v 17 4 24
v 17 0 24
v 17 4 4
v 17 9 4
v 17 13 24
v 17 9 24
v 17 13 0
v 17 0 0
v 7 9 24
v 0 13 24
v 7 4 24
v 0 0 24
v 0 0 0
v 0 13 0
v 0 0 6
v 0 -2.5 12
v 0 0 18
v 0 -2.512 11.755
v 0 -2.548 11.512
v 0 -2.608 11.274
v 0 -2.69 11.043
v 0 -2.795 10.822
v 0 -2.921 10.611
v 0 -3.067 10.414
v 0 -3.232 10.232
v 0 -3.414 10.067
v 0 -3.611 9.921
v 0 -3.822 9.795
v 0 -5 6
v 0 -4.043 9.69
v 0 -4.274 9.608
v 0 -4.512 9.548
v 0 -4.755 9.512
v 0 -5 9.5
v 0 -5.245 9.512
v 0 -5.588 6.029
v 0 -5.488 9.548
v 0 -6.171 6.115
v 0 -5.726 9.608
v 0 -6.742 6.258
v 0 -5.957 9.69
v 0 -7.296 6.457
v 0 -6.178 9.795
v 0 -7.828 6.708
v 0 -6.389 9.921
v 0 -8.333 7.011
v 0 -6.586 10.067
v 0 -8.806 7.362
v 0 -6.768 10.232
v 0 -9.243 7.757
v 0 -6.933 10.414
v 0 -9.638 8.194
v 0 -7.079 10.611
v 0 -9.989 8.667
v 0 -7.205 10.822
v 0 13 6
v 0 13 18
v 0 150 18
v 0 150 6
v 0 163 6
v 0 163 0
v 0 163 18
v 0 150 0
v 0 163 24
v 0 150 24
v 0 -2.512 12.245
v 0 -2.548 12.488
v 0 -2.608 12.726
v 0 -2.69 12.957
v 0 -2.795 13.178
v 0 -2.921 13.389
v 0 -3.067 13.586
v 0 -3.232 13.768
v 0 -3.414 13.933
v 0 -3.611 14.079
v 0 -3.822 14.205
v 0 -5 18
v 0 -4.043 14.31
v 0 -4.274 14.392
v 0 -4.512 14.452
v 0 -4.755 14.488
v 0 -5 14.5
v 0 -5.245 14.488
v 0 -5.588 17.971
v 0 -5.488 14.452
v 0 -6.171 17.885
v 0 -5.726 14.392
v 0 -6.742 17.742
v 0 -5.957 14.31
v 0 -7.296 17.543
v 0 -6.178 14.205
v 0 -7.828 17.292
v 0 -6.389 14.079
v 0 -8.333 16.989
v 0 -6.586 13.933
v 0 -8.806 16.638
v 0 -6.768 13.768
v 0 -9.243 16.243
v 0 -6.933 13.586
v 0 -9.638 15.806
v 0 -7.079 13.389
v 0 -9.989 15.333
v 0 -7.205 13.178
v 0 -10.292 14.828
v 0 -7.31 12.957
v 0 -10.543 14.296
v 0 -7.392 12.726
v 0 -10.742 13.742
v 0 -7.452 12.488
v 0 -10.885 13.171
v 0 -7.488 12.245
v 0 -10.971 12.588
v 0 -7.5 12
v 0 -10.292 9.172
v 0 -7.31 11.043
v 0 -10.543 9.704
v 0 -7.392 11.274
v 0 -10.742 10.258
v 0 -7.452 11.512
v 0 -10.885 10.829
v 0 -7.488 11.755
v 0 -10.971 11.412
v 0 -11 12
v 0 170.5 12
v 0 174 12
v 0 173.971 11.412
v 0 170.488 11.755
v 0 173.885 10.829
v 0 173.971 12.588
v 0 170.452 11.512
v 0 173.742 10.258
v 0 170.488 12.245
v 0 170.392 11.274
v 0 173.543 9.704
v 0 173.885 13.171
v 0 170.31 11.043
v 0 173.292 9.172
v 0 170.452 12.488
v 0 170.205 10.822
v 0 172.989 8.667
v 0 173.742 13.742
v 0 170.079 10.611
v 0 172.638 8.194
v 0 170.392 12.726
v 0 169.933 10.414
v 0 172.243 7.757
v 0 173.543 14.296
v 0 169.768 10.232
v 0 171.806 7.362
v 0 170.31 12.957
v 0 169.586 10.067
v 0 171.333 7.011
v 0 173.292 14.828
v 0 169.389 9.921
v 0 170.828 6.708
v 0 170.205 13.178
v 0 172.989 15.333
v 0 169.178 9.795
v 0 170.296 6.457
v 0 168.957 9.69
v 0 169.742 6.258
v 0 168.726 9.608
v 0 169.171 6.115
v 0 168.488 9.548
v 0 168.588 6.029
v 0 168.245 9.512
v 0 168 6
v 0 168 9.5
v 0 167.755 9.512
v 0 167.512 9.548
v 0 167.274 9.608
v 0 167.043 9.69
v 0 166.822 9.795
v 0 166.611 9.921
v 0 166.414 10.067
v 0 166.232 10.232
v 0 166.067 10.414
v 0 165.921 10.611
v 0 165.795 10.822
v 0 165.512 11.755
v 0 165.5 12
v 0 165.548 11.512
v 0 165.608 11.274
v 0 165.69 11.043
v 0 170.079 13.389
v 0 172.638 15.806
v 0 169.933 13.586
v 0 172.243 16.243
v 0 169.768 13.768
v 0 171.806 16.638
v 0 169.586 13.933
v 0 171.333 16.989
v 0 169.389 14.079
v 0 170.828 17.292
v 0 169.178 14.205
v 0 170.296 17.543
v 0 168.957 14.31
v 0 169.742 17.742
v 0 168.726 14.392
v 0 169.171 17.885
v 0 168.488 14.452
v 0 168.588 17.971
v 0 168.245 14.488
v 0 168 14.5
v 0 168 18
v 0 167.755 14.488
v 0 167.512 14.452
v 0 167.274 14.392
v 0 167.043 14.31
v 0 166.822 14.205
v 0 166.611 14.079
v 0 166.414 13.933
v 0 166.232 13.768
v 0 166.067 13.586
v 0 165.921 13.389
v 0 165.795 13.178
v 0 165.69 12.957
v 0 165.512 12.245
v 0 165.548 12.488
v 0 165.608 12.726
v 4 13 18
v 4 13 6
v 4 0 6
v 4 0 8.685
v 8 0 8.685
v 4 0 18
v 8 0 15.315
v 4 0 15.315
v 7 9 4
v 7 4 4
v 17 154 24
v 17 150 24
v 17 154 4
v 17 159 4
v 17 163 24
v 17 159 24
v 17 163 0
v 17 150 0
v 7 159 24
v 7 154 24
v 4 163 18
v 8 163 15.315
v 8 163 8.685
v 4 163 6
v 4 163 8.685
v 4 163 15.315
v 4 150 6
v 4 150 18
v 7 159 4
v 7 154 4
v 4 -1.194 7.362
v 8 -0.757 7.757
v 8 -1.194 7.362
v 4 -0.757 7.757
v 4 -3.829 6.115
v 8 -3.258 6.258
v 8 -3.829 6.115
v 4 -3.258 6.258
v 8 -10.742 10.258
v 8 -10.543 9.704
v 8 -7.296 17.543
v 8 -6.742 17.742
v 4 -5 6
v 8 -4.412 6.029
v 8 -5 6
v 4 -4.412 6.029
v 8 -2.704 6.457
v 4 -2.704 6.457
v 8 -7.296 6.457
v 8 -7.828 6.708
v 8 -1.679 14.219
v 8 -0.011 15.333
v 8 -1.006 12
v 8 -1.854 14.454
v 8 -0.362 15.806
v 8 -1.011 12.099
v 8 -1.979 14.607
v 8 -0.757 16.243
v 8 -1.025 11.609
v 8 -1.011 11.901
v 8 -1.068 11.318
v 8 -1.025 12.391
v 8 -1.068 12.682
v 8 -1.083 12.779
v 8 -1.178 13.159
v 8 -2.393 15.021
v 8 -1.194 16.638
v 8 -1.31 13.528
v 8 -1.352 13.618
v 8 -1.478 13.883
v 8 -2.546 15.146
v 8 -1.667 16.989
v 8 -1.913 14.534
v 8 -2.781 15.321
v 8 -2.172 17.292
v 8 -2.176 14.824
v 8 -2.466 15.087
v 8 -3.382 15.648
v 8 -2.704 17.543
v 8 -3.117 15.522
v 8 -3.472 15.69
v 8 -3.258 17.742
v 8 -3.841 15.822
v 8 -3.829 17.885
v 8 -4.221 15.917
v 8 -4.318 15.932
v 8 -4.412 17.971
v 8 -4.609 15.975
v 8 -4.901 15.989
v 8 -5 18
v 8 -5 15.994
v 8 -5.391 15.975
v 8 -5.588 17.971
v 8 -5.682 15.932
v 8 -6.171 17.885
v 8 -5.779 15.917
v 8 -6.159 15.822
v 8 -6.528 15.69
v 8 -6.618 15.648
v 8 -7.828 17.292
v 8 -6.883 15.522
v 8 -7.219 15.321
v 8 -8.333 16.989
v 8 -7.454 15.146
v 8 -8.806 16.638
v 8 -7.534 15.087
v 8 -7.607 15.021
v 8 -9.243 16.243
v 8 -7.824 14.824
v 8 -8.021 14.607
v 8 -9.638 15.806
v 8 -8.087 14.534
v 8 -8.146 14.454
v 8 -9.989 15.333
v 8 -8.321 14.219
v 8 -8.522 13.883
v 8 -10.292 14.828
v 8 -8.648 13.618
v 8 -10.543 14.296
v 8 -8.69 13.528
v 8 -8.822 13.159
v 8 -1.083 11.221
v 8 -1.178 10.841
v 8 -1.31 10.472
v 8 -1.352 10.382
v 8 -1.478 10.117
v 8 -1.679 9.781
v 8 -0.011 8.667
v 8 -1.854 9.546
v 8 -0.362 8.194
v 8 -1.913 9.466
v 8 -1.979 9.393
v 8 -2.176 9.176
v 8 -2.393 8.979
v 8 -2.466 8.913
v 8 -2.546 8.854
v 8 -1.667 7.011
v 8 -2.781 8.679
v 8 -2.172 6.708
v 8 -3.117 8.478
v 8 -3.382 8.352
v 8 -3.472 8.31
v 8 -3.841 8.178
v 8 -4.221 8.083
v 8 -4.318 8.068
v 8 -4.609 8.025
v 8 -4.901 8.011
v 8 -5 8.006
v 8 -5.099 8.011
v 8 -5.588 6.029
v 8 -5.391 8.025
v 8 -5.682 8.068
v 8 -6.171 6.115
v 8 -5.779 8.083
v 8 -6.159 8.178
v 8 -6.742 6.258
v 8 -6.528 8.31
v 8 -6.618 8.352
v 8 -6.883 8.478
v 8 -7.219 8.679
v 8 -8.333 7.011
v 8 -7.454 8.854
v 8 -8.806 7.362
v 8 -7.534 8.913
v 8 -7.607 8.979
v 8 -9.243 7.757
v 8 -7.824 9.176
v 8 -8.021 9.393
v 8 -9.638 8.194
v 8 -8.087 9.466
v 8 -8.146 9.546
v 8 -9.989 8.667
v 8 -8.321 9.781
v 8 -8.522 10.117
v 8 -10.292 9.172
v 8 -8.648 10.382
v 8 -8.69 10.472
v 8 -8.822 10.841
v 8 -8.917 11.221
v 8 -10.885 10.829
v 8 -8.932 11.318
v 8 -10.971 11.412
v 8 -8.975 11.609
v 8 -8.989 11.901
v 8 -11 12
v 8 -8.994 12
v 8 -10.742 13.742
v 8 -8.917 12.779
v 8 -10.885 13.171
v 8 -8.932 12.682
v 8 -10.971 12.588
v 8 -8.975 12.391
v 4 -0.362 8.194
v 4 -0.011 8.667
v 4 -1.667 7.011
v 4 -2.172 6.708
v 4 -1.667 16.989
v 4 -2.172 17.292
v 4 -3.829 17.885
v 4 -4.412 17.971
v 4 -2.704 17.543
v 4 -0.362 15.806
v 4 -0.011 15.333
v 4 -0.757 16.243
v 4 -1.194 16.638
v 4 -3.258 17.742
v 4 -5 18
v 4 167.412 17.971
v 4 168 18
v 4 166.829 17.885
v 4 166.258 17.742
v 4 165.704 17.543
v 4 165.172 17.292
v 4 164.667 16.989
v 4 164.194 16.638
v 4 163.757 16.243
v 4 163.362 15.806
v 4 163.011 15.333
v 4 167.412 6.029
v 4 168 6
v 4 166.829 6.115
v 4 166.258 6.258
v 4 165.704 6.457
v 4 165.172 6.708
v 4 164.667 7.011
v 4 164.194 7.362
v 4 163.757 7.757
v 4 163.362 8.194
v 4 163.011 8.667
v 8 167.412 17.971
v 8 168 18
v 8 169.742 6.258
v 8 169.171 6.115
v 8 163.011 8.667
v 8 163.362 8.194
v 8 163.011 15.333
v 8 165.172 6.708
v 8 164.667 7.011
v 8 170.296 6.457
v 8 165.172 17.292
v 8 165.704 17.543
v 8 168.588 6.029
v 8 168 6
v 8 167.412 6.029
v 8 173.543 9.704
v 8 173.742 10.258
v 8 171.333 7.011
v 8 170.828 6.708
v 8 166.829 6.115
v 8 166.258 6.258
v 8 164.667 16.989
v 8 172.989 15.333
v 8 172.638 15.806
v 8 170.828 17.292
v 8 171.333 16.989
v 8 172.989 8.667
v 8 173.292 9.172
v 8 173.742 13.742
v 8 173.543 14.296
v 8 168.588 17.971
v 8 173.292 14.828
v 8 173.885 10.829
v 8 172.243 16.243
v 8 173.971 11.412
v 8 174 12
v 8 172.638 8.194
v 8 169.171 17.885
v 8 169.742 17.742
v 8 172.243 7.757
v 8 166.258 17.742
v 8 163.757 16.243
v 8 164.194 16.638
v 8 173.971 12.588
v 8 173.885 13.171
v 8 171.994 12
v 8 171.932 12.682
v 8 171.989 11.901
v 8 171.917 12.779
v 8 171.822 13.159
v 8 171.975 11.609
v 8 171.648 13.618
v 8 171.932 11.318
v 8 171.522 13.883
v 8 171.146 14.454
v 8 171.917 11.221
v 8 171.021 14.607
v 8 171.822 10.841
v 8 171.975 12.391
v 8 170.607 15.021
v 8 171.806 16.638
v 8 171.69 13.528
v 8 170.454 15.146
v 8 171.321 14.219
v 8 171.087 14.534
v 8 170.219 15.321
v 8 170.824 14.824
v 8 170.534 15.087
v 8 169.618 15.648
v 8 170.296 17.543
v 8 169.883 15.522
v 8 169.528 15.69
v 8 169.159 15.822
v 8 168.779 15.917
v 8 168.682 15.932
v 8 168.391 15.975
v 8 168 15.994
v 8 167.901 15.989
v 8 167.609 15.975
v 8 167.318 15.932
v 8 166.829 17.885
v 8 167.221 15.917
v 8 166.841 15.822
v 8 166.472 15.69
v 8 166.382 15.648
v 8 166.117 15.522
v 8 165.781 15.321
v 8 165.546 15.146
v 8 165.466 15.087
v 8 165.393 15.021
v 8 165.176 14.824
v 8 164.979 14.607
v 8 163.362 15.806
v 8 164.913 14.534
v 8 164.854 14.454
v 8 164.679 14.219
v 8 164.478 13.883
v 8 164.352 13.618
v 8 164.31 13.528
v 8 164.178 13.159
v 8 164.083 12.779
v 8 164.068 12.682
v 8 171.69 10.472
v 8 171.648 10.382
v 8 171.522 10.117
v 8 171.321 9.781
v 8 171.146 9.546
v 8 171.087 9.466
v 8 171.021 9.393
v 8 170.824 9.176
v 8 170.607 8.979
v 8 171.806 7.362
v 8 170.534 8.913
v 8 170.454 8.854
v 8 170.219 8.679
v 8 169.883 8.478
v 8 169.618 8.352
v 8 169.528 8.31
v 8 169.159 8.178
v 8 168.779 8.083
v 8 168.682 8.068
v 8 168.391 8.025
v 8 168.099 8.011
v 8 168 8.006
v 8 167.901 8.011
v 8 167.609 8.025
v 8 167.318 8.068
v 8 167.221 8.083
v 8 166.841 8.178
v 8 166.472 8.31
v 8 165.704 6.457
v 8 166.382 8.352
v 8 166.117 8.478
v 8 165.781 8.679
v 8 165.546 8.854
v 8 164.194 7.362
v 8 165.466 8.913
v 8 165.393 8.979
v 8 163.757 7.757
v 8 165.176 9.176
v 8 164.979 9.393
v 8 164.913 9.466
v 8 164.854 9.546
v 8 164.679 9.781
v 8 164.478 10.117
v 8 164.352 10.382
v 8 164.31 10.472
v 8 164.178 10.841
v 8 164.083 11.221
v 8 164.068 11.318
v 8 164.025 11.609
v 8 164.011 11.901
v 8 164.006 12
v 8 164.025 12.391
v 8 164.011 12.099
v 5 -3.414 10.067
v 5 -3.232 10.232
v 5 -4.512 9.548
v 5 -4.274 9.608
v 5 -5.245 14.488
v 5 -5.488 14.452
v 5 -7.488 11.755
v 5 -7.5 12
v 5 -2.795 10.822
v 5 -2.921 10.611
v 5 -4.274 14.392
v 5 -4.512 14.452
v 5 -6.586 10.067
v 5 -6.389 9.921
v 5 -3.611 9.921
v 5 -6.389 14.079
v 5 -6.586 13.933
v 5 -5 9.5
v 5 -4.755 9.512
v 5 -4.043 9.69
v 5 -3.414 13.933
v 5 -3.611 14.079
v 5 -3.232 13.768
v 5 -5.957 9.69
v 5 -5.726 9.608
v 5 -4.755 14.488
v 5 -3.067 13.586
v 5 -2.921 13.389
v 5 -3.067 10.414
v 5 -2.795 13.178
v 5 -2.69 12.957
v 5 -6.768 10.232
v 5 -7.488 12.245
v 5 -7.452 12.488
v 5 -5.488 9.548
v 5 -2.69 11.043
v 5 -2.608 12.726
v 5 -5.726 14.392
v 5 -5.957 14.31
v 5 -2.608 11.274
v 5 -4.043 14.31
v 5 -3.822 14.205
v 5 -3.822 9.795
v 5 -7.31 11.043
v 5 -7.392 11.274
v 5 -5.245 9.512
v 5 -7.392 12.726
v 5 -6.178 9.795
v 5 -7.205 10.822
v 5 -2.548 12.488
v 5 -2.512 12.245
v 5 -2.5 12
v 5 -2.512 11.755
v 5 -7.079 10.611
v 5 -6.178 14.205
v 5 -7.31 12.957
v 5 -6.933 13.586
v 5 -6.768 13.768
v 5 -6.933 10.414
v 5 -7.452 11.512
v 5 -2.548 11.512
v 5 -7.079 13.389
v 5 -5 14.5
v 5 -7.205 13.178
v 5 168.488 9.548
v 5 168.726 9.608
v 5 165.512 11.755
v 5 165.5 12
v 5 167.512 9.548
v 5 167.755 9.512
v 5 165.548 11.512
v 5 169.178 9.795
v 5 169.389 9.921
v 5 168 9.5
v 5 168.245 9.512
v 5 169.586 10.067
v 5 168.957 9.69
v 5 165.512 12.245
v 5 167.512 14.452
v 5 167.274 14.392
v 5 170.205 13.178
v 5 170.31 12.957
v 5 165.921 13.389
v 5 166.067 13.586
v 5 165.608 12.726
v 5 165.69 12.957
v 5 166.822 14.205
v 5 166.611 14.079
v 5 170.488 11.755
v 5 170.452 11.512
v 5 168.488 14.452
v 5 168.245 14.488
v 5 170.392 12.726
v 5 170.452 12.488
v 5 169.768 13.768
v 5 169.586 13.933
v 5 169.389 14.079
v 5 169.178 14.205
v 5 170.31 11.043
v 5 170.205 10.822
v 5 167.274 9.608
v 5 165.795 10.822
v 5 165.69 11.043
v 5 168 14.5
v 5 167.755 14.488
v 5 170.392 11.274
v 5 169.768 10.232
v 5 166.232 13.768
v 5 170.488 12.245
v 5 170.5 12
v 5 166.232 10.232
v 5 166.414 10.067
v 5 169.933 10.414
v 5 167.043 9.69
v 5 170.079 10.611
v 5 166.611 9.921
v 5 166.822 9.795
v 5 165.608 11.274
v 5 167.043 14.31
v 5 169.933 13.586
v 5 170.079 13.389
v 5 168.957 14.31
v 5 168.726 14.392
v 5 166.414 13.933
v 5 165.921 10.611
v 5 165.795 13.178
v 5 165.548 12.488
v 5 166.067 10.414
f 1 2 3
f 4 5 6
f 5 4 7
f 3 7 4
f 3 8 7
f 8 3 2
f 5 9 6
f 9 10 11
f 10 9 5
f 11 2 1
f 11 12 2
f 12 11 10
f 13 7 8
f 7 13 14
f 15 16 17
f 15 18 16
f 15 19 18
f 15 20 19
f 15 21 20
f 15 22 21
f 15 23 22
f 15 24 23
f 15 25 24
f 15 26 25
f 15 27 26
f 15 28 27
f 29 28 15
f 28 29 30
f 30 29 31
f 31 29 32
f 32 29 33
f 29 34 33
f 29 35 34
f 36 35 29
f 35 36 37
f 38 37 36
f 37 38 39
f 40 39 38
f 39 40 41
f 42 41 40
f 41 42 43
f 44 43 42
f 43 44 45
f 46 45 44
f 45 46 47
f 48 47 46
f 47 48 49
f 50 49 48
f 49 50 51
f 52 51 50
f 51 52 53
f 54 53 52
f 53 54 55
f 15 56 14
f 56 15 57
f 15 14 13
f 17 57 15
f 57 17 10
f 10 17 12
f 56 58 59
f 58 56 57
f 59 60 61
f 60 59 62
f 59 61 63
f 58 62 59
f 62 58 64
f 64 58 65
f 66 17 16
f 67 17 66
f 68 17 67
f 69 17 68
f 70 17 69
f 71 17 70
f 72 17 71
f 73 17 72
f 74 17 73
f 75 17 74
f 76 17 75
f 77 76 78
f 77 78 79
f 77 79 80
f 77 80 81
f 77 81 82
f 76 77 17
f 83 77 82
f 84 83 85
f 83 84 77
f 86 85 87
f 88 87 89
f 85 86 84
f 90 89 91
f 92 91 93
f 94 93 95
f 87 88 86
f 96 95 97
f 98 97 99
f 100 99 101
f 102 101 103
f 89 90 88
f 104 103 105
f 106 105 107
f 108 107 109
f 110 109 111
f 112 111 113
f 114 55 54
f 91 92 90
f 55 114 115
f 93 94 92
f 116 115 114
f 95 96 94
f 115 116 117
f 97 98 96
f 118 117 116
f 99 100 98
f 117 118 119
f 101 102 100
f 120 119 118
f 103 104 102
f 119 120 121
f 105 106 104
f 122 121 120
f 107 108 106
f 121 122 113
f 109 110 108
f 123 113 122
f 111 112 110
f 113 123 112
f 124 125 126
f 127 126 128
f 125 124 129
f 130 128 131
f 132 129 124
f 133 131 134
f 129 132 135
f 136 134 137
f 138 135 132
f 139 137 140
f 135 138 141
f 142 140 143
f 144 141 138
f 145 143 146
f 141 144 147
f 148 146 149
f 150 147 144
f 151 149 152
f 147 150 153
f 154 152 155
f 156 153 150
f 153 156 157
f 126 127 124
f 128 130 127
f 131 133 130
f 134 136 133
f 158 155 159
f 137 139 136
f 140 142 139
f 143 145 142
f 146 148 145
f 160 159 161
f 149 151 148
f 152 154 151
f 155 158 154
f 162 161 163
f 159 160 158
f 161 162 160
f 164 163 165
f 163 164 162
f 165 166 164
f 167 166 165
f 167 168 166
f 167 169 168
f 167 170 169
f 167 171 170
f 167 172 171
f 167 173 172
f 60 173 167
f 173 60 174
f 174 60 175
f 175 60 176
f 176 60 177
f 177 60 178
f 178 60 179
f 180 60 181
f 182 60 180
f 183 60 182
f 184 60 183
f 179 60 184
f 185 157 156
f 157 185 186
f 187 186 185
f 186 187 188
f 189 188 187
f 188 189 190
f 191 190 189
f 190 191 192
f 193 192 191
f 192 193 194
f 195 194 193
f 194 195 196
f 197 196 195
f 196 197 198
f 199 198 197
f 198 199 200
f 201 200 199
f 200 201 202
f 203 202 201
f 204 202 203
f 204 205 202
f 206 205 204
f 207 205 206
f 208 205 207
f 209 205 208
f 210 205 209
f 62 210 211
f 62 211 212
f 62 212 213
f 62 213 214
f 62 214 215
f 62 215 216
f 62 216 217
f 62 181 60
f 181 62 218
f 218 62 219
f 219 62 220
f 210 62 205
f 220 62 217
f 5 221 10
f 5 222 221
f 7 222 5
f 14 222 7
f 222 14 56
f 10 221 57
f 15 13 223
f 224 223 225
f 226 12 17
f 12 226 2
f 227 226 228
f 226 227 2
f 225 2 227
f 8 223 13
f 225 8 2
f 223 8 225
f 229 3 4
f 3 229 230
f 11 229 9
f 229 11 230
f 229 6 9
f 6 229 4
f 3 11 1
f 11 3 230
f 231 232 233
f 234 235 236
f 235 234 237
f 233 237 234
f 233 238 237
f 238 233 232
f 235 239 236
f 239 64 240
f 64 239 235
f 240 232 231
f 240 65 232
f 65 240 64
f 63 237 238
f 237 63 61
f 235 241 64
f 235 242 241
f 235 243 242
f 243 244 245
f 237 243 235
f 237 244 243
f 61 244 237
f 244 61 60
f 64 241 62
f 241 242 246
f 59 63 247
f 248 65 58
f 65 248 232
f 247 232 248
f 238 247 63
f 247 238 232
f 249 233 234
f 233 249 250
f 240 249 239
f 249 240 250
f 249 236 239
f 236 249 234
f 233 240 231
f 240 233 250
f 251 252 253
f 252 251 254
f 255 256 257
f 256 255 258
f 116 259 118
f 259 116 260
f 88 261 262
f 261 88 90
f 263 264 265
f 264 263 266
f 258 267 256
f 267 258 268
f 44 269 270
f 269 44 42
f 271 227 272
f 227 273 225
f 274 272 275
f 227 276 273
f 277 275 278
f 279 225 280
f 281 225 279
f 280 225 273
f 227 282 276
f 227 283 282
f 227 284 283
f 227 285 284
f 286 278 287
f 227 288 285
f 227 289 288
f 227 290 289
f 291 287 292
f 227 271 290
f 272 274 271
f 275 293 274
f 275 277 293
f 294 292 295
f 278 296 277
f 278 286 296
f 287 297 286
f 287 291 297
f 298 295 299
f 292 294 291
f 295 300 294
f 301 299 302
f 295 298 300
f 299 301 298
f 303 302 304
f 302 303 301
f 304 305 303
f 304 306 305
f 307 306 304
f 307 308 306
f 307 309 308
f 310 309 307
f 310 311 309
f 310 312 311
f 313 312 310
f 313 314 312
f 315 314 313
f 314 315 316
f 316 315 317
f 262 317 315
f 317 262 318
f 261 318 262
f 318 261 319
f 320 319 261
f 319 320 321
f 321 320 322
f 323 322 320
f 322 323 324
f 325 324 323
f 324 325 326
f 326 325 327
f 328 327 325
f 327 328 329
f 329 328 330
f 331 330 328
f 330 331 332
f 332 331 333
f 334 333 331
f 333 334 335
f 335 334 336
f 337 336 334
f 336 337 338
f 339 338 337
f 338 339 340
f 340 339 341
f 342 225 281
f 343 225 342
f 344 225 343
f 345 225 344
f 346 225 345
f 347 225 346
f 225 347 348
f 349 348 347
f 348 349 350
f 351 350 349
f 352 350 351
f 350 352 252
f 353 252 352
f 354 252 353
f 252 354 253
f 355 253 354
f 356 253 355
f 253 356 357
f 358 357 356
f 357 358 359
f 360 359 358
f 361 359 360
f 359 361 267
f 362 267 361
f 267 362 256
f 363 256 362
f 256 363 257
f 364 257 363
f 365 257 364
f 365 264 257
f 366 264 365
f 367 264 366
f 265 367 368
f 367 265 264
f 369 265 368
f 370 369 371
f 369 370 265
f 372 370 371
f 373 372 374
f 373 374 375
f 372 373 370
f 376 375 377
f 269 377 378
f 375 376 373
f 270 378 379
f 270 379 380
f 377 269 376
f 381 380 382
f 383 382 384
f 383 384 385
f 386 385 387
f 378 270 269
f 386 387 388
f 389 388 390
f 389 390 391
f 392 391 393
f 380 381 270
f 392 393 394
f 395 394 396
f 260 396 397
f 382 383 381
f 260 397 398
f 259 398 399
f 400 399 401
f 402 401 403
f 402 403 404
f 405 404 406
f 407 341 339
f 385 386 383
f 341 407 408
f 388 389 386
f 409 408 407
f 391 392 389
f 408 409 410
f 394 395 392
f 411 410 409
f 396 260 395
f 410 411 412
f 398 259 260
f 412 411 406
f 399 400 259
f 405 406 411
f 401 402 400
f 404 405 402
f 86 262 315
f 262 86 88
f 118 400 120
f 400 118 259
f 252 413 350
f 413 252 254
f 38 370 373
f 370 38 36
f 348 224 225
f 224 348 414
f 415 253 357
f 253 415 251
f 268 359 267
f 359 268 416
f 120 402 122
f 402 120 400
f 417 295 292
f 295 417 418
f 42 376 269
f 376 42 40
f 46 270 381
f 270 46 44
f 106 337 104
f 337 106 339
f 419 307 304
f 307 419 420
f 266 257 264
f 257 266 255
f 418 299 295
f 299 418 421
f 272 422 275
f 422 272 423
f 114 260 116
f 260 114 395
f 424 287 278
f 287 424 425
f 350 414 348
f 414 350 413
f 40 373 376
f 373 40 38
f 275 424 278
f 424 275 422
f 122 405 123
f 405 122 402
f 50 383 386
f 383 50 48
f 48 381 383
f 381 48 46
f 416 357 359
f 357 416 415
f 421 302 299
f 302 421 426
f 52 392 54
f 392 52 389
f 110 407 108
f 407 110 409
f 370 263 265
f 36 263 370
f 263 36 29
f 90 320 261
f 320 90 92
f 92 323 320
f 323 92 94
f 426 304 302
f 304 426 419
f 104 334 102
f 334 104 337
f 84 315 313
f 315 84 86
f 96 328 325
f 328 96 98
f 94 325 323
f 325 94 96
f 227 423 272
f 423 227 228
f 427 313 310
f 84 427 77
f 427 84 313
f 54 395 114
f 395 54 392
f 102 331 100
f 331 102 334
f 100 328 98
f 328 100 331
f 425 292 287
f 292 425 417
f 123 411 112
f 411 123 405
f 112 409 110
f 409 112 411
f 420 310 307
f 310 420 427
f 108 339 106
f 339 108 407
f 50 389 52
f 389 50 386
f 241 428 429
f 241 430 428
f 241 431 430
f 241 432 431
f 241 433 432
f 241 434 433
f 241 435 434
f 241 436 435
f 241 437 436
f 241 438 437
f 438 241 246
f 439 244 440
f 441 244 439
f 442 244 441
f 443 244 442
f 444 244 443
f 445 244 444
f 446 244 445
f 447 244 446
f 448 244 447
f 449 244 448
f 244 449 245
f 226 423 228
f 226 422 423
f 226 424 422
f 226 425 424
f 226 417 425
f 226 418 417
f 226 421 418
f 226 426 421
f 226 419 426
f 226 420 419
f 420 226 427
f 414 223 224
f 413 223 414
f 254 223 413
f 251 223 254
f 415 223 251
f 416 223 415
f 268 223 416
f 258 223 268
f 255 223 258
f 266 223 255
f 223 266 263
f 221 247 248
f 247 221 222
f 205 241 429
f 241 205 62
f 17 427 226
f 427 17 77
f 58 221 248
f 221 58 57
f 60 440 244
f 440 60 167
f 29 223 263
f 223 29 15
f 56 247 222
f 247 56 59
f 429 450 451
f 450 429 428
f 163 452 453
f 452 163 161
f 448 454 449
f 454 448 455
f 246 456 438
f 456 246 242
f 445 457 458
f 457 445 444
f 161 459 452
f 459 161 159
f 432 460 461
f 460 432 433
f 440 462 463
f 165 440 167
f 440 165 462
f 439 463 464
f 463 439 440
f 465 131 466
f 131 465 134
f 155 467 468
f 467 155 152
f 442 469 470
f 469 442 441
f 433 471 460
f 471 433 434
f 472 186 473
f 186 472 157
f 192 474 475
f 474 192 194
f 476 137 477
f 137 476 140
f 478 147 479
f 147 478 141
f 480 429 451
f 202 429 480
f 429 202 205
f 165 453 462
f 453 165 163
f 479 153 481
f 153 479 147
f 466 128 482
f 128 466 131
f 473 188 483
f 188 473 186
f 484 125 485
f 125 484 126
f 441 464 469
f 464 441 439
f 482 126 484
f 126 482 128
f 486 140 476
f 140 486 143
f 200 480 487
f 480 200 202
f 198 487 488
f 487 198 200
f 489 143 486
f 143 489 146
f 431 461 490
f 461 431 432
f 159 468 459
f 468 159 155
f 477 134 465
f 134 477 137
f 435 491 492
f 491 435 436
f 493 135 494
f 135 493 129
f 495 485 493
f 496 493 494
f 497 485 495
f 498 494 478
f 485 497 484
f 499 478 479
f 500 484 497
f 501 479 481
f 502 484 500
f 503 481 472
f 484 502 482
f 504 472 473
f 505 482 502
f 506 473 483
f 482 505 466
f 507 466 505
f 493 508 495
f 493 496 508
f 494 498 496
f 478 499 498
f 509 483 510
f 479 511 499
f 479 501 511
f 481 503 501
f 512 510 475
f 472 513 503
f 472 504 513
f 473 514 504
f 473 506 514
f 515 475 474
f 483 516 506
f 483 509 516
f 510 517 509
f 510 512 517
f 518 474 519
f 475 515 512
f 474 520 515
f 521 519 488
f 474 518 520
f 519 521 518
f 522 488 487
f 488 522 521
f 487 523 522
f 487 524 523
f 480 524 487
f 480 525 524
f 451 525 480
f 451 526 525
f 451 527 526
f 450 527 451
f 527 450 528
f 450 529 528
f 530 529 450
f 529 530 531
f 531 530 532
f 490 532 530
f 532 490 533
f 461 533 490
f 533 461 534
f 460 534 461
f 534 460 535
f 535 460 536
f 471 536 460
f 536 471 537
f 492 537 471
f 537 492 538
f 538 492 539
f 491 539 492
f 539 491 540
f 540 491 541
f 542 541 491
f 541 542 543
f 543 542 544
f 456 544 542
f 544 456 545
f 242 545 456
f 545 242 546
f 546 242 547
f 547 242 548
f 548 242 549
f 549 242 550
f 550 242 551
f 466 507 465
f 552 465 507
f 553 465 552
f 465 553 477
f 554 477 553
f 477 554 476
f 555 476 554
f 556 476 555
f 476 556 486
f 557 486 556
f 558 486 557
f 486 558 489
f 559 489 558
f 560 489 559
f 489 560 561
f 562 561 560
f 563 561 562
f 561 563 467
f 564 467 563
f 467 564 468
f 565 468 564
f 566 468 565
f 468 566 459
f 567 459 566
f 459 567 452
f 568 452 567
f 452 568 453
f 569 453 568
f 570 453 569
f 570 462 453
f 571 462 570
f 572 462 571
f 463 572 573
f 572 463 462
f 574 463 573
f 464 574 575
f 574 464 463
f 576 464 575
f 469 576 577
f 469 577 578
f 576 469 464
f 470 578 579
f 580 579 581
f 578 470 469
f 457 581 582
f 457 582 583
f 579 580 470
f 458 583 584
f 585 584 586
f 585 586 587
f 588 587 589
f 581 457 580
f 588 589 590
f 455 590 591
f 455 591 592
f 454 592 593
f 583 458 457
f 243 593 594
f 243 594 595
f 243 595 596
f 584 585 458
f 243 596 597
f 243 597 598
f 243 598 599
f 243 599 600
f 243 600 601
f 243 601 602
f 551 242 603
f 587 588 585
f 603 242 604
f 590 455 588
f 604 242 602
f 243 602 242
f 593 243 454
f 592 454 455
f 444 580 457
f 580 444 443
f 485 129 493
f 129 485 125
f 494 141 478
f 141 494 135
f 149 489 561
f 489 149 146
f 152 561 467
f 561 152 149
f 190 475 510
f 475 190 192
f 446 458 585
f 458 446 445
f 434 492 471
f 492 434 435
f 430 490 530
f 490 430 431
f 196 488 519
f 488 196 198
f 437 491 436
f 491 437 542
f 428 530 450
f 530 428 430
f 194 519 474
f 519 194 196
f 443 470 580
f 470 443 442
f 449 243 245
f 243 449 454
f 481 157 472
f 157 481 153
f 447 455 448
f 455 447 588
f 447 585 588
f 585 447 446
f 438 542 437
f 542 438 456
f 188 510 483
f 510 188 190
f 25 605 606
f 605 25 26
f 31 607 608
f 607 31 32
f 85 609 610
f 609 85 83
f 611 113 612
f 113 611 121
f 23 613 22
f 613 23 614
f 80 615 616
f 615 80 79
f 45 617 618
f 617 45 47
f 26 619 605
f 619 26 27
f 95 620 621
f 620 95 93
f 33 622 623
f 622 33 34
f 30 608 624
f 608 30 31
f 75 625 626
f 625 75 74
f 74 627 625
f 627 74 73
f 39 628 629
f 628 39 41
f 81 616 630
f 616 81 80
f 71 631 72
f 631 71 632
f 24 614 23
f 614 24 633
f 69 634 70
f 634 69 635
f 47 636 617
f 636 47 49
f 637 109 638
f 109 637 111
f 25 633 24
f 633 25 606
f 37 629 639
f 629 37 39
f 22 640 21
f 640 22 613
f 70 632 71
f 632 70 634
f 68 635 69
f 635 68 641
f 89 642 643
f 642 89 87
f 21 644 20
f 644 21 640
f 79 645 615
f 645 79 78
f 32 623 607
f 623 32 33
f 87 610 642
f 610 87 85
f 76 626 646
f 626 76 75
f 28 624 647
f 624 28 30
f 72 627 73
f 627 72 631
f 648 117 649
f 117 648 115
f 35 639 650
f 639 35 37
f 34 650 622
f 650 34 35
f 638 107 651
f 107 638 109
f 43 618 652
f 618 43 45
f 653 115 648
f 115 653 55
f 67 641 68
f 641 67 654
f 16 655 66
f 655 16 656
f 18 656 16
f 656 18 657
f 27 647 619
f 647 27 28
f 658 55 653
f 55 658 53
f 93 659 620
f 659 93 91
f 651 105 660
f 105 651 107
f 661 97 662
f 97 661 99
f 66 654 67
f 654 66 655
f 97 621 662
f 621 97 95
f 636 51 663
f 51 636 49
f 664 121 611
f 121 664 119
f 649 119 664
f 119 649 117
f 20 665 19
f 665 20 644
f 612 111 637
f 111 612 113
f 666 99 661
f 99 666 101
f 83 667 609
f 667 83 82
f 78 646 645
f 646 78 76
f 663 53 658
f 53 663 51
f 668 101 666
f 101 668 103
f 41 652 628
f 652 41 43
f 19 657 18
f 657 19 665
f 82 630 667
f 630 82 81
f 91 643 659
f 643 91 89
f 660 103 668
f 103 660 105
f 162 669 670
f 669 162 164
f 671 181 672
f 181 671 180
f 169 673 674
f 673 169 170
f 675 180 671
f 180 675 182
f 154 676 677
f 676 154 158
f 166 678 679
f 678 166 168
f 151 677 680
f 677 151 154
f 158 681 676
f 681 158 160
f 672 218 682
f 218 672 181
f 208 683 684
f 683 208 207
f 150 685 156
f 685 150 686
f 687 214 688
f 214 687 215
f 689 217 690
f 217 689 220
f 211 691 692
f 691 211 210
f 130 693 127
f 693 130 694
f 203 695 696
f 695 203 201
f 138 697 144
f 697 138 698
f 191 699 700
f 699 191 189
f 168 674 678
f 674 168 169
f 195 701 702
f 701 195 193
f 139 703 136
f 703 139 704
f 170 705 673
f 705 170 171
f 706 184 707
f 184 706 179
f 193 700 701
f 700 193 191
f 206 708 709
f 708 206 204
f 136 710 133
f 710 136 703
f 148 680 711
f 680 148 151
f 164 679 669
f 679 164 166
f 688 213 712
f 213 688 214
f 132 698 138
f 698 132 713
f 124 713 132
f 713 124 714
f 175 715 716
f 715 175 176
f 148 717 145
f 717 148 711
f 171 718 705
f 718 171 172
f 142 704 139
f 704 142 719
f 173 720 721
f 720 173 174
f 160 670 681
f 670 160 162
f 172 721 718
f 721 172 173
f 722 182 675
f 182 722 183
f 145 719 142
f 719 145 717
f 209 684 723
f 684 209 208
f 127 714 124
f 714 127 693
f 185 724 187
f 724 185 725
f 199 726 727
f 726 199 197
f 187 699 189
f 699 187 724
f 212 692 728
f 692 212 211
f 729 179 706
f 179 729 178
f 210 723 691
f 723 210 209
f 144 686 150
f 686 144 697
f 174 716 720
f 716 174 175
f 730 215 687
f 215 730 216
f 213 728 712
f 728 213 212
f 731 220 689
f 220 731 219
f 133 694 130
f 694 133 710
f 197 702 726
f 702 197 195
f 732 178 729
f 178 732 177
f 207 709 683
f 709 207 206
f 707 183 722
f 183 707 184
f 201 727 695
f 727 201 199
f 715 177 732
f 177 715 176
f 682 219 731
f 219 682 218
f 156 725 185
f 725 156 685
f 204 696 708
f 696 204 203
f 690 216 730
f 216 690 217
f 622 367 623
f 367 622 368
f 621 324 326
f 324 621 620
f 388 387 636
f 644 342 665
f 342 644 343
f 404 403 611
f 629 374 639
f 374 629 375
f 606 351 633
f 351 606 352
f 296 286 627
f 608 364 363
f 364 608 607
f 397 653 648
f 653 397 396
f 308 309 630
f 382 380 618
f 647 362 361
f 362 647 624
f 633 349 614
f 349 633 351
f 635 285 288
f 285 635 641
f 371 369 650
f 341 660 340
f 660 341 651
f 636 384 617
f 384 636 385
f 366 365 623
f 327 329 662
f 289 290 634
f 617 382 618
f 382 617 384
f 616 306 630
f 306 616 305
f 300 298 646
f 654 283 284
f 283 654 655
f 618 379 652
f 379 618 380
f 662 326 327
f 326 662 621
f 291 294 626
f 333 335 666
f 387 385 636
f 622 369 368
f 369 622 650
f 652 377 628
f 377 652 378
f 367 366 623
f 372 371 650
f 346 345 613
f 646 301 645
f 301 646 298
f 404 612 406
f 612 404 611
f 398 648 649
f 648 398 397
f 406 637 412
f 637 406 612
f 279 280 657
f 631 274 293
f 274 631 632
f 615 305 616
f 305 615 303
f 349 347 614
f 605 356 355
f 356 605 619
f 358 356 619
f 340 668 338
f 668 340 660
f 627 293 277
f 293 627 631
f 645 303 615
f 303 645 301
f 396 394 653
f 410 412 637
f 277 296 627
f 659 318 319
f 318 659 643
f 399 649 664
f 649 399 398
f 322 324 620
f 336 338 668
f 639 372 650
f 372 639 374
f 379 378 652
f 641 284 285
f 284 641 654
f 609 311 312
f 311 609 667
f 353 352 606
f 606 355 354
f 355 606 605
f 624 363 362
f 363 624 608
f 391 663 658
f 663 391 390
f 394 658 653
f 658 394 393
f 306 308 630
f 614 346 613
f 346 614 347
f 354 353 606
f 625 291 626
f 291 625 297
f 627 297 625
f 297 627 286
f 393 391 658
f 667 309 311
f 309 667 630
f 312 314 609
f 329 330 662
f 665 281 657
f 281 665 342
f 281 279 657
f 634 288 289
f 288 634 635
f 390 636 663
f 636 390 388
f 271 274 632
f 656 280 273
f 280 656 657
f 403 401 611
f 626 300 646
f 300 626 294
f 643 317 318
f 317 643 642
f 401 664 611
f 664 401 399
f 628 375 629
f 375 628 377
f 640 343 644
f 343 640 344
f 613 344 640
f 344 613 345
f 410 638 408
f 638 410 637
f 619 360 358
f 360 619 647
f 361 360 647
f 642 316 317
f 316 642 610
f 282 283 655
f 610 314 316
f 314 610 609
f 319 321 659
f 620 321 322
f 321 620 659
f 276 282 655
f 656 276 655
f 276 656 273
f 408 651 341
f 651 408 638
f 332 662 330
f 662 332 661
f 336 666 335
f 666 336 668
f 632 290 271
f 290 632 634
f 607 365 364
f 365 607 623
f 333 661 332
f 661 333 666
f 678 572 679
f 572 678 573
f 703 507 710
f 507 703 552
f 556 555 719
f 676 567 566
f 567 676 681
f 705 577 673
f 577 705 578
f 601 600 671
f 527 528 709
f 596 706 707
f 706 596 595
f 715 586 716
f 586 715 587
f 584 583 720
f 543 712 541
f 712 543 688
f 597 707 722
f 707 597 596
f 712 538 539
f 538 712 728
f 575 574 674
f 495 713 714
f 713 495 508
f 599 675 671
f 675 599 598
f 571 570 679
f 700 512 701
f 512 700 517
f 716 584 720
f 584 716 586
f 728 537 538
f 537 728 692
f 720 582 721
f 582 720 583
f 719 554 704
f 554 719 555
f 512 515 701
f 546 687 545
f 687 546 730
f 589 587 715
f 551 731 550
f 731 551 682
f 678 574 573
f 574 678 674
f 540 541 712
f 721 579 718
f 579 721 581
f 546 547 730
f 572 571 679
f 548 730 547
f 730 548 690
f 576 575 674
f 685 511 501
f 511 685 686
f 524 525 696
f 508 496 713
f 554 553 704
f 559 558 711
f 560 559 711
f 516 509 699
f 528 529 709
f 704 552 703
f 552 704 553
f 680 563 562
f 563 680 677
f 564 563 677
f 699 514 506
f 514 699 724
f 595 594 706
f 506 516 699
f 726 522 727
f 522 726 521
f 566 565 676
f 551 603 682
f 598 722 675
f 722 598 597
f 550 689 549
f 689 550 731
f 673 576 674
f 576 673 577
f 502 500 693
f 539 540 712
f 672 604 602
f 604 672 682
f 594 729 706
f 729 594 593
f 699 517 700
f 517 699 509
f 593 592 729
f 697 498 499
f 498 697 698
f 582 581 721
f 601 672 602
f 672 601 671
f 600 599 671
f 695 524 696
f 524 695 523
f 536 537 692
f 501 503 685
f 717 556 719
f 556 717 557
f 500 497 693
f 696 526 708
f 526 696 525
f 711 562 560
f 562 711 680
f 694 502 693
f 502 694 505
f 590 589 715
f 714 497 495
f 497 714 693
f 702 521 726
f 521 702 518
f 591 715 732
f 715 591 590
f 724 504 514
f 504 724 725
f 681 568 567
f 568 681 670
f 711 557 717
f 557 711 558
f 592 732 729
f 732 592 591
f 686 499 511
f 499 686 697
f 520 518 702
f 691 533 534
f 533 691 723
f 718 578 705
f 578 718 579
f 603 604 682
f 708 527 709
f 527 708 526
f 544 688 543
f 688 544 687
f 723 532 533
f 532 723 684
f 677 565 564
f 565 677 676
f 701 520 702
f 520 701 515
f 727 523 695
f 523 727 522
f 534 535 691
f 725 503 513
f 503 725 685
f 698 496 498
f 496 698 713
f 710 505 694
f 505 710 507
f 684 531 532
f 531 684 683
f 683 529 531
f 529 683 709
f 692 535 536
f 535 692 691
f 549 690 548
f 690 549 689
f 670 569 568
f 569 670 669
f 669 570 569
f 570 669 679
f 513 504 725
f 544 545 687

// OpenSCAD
$fn=64;

difference() {
  union() {
    bracket();
    translate([0,-5,12]) rotate([0,90,0]) cylinder(r=6,h=8);
    translate([0,-5,6]) cube([4,173,12]);
    translate([0,168,12]) rotate([0,90,0]) cylinder(r=6,h=8);
    translate([0,150,0]) bracket();
  }
  translate([-0.01,-5,12]) rotate([0,90,0]) cylinder(r=2.5, h=5.02);
  translate([-0.01,168,12]) rotate([0,90,0]) cylinder(r=2.5, h=5.02);

  translate([5,-5,12]) rotate([0,90,0]) cylinder(r1=2.5, r2=5, h=5.02);
  translate([5,168,12]) rotate([0,90,0]) cylinder(r1=2.5, r2=5, h=5.02);
}

module bracket() difference() {
   cube([17,13,24]);
   translate([7,4,4]) cube([11,5,21]);
}
